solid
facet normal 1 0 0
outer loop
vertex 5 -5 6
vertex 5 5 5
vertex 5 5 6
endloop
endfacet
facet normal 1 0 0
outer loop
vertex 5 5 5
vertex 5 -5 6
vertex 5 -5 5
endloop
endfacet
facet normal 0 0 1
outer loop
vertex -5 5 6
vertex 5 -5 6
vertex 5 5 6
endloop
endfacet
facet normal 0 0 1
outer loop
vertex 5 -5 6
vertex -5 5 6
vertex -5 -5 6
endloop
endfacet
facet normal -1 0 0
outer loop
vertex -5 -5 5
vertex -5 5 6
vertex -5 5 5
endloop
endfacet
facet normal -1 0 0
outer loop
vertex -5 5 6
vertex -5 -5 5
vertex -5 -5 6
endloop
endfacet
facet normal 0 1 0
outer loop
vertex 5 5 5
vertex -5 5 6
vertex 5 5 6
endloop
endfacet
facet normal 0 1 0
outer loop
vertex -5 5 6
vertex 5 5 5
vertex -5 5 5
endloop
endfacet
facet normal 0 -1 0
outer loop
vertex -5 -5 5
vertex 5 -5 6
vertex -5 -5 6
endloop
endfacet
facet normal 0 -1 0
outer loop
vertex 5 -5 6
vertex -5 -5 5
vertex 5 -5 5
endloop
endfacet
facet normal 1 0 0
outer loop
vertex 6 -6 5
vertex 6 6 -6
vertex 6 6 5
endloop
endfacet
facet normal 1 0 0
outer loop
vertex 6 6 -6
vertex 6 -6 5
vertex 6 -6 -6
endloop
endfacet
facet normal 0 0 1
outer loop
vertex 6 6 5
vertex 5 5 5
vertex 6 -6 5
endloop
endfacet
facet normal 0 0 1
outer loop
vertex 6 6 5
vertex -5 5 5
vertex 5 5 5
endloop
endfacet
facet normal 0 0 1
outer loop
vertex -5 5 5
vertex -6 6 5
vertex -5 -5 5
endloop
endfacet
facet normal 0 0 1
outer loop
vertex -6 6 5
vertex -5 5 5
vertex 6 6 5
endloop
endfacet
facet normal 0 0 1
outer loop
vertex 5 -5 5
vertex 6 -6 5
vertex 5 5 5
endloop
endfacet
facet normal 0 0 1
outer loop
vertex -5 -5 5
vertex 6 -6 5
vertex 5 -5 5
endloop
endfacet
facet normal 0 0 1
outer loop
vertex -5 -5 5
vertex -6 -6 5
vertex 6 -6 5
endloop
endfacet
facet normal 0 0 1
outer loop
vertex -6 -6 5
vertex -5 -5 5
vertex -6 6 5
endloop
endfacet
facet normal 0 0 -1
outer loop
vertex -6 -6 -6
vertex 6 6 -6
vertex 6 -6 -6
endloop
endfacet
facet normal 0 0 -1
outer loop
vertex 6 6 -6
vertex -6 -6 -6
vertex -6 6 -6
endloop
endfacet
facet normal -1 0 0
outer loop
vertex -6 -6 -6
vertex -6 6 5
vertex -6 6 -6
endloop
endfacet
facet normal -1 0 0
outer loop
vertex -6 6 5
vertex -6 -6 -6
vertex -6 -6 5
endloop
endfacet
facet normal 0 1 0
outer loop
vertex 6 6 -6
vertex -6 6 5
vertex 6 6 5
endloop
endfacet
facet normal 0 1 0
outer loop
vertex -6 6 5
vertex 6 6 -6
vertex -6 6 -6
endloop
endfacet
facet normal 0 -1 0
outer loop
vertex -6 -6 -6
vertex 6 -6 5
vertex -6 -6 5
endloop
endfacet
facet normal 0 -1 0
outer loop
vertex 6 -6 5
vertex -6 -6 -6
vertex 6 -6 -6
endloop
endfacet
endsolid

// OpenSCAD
// Unit of length: Unit.MM
union()
{
   color(c = [1.0, 0.0, 0.0, 1.0])
   {
      translate(v = [0.0, 0.0, 0.5])
      {
         cube(size = [10.0, 10.0, 11.0], center = true);
      }
   }
   translate(v = [0.0, 0.0, -0.5])
   {
      cube(size = [12.0, 12.0, 11.0], center = true);
   }
}
